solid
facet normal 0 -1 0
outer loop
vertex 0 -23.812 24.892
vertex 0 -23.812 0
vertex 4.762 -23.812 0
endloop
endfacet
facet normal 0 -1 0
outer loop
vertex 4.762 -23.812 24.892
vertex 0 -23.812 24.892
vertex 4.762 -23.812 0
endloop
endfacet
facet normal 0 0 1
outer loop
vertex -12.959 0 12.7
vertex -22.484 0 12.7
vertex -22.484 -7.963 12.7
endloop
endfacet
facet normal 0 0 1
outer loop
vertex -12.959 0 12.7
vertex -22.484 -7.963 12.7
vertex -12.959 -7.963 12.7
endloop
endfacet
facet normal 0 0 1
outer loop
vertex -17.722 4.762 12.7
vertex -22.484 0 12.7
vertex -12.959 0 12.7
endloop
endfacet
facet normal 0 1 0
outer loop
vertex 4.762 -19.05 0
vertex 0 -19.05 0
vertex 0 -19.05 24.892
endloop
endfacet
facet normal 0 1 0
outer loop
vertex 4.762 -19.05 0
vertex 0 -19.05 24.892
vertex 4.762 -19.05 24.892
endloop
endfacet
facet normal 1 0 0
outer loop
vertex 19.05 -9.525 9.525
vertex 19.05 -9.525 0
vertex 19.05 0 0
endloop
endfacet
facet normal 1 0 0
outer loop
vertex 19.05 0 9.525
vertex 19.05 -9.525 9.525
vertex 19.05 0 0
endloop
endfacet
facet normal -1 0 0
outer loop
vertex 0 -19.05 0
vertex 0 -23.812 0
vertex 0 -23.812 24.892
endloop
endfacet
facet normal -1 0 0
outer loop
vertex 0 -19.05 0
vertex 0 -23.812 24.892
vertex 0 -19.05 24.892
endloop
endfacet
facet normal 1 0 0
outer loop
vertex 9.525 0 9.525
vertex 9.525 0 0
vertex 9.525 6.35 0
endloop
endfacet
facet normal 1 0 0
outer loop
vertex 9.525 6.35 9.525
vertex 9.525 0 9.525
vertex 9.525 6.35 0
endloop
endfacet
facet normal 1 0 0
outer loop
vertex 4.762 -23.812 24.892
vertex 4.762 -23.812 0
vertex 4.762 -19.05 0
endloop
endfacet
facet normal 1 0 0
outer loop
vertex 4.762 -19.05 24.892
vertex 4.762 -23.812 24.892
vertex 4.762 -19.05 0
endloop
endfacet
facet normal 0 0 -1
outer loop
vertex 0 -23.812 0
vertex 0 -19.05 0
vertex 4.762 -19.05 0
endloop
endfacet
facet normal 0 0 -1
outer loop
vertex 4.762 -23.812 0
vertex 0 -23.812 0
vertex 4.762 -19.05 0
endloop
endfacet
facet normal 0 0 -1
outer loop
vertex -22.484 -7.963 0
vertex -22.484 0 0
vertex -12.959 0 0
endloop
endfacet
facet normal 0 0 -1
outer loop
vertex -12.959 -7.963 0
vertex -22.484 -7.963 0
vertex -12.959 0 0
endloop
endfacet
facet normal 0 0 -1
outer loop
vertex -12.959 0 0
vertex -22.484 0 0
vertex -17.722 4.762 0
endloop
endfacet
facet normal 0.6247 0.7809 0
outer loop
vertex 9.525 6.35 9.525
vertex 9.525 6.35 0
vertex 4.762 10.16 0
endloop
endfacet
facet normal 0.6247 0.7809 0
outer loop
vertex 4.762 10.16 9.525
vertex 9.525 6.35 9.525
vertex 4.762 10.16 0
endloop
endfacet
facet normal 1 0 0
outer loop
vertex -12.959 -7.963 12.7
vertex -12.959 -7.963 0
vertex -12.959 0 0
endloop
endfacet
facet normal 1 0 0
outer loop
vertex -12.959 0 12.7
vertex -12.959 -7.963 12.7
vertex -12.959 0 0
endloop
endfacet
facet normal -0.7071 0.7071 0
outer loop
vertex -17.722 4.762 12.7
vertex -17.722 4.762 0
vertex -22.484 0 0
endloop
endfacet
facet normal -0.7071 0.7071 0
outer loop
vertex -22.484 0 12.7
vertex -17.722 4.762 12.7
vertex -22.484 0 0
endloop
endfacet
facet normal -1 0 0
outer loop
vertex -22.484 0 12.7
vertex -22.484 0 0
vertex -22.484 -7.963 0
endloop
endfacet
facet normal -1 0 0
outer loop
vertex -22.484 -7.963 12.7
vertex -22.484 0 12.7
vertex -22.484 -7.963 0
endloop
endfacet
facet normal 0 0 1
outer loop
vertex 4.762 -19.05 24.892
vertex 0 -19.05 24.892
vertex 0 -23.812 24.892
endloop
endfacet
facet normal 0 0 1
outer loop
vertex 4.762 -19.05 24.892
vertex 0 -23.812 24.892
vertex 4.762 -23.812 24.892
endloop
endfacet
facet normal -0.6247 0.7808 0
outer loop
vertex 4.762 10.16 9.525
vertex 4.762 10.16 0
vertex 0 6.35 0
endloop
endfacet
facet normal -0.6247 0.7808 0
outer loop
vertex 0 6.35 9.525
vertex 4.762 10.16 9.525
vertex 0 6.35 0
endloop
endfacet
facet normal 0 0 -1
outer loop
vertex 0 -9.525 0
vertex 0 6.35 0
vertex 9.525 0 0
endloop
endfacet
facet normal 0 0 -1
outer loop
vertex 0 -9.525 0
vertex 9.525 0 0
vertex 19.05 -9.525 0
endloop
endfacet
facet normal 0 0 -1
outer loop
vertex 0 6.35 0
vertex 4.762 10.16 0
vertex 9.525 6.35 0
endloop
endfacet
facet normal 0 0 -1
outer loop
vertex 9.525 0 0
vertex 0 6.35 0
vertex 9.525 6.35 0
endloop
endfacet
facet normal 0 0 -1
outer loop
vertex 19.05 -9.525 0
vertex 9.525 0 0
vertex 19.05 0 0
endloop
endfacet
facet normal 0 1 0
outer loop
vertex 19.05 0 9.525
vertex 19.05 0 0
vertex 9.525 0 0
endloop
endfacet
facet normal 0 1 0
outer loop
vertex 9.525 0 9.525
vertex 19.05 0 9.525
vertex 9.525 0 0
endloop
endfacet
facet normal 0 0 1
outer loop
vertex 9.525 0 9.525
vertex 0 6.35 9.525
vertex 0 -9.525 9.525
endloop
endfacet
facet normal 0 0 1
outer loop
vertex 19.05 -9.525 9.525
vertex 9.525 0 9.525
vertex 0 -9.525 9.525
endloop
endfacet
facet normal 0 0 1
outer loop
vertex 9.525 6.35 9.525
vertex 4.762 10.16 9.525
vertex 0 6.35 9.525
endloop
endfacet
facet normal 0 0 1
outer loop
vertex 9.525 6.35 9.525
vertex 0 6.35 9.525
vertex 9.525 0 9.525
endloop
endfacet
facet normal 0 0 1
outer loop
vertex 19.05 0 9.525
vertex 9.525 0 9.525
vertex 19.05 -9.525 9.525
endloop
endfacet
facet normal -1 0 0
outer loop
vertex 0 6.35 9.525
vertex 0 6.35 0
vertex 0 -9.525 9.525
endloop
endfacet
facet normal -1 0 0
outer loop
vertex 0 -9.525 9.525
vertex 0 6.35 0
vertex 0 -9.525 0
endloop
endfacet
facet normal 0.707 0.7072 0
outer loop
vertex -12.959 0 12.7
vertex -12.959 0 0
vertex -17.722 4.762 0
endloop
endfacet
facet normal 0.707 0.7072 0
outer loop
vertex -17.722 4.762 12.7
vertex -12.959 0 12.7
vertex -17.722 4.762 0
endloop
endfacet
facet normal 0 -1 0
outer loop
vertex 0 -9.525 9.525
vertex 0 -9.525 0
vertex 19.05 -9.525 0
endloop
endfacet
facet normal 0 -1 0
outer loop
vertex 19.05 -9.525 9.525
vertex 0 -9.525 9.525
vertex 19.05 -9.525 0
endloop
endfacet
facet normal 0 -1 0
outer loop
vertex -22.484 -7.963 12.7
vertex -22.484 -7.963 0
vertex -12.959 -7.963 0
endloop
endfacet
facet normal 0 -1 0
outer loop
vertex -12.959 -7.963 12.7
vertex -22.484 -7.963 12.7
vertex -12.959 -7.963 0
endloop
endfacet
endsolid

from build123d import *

# Parameters (mm, degrees)
F1_DEPTH = 9.525
F3_DEPTH = 12.7
F4_W     = 4.7625
F4_H     = 4.7625
F5_DEPTH = 24.892


# Not quite as in the source:
# - a length typed as a fraction of an inch, garbled in the dataset ("3 / 203.2 mm" for 3/8 in), is restored


with BuildPart() as f1:
    # F0 (on Top) → F1 (new body)
    with BuildSketch(Plane.XY):
        Polygon((19.05, -9.525), (19.05, 0), (9.525, 0), (9.525, 6.35), (4.7625, 10.16), (0, 6.35), (0, 0), (0, -9.525), align=None)
    extrude(amount=F1_DEPTH)


with BuildPart() as f3:
    # F2 (on Top) → F3 (new body)
    with BuildSketch(Plane.XY):
        Polygon((-22.4840769566, 0), (-22.4840769566, -7.9629), (-12.9590769566, -7.9629), (-12.9590769566, 0), (-17.7215769566, 4.7625), align=None)
    extrude(amount=F3_DEPTH)


with BuildPart() as f5:
    # F4 (on Top) → F5 (new body)
    with BuildSketch(Plane.XY):
        with Locations((2.38125, -21.43125)):
            Rectangle(F4_W, F4_H)
    extrude(amount=F5_DEPTH)


solid = Compound([f1.part, f3.part, f5.part])
